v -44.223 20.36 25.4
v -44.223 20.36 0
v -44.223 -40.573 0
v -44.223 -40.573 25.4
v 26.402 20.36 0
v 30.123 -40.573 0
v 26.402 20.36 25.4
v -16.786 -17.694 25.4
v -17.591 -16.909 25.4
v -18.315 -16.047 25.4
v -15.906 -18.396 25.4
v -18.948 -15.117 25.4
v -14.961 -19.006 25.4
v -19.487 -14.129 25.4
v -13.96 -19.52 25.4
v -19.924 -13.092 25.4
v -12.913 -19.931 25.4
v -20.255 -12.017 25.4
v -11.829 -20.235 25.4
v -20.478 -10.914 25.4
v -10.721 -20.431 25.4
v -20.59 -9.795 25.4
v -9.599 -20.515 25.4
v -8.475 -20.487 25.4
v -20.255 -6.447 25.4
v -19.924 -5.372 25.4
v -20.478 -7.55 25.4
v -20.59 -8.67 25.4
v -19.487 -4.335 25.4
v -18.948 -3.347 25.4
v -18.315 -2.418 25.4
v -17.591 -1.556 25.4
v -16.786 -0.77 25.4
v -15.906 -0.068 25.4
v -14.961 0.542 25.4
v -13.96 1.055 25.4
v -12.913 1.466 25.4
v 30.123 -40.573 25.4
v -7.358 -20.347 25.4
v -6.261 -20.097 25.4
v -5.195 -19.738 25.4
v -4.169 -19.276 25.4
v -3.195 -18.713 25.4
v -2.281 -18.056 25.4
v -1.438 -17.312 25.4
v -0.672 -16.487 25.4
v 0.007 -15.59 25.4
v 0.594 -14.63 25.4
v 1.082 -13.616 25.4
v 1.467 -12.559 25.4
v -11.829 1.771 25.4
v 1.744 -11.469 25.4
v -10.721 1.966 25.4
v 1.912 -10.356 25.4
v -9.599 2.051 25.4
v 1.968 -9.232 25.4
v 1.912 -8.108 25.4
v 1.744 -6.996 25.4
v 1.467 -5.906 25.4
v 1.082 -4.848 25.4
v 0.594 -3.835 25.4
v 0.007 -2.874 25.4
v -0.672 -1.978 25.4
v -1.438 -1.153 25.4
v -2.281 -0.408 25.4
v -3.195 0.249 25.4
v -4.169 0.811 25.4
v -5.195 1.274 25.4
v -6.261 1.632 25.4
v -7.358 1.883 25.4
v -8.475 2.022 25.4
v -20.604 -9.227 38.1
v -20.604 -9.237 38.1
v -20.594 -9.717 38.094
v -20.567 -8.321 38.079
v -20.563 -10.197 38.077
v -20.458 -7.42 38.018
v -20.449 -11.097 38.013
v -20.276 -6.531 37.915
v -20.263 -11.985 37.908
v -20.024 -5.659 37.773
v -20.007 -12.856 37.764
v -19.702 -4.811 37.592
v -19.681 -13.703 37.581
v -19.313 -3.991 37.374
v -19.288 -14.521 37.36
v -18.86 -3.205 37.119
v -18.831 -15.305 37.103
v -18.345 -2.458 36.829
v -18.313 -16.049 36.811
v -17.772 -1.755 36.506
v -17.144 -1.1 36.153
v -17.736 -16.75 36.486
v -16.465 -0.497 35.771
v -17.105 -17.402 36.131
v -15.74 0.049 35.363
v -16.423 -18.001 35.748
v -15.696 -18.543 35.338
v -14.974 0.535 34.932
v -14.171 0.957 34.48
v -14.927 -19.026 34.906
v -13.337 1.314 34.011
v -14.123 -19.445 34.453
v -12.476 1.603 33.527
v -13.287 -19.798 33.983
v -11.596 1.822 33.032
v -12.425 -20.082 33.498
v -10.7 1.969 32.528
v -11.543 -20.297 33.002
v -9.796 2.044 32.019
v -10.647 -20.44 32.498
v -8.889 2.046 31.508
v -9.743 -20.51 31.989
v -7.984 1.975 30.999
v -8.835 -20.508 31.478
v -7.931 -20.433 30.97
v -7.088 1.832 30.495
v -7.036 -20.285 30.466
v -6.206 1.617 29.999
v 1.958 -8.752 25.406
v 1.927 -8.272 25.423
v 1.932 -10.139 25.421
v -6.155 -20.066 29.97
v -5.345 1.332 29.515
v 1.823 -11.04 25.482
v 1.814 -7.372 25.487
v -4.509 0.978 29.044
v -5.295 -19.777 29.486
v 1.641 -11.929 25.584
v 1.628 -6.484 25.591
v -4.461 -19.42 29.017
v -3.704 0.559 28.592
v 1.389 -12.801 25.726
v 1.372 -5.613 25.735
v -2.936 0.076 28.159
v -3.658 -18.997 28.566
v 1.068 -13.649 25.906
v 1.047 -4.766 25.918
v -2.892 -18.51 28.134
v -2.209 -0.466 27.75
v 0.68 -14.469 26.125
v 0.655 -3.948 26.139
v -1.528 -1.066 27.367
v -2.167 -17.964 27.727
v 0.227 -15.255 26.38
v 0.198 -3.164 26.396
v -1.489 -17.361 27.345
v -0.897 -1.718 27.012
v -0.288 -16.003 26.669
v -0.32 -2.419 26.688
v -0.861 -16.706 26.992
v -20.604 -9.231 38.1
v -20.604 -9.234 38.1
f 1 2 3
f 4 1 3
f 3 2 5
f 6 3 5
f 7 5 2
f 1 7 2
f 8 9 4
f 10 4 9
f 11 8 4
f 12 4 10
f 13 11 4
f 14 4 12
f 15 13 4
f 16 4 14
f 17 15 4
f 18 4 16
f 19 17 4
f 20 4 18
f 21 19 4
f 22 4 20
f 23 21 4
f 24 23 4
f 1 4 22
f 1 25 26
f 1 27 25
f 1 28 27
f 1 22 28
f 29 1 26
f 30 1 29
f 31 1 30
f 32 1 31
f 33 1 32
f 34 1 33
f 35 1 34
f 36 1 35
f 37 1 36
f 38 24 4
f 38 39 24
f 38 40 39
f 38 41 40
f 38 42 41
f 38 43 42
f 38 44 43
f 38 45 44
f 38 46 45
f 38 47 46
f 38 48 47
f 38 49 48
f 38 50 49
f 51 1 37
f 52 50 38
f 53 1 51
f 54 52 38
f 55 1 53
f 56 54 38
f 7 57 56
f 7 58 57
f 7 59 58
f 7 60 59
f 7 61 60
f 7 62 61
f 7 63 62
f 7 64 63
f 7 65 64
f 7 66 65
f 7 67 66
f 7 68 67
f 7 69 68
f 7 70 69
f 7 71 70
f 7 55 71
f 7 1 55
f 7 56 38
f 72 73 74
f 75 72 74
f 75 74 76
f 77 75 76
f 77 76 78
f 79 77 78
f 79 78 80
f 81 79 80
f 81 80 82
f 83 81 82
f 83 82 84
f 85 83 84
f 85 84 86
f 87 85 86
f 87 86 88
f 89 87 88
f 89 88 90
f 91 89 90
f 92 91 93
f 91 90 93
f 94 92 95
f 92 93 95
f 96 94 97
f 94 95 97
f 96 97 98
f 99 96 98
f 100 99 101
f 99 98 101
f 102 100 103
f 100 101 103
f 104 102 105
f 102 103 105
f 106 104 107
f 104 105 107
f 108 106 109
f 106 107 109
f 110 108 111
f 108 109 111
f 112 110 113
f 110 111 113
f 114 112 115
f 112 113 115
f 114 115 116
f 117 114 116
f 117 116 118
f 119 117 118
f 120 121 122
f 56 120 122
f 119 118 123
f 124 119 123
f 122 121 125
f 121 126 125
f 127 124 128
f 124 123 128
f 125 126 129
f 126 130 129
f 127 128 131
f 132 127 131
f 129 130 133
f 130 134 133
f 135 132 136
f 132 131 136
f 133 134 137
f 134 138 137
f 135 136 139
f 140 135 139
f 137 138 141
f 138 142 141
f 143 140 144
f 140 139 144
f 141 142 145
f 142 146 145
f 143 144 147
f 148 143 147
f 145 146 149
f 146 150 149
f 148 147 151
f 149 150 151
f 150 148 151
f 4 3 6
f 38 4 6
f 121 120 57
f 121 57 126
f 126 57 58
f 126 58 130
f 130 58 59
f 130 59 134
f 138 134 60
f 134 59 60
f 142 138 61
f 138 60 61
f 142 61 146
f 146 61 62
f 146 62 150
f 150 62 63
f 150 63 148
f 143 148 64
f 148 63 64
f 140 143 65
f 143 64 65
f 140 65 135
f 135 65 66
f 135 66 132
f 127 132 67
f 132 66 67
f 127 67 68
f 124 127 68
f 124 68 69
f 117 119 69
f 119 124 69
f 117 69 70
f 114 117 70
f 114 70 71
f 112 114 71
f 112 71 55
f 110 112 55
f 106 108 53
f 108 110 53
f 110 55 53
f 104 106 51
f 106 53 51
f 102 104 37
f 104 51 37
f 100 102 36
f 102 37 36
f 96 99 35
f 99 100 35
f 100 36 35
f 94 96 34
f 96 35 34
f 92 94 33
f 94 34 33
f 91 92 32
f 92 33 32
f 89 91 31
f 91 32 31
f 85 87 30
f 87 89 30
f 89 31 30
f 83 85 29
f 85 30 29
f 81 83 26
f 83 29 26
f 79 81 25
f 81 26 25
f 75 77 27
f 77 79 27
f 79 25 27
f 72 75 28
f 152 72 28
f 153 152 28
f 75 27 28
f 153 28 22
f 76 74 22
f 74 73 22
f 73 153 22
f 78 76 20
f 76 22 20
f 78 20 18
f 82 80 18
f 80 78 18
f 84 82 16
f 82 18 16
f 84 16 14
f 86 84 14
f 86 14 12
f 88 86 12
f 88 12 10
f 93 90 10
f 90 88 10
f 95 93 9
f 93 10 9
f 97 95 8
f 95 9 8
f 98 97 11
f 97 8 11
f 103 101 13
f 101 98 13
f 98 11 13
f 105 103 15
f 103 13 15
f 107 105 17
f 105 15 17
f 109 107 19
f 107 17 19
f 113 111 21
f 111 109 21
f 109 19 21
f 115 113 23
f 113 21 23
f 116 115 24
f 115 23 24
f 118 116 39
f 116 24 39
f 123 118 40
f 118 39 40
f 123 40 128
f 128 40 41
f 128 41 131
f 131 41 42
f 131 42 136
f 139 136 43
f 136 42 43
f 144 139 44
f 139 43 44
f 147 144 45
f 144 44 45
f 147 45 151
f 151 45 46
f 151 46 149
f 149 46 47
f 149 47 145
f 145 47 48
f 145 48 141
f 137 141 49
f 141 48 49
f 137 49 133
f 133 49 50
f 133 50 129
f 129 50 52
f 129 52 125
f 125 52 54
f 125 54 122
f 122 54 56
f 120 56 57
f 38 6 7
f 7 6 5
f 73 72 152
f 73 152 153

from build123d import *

# Parameters (mm, degrees)
F1_DEPTH = 25.4
F2_R     = 11.286244
F3_DEPTH = 12.7
F5_DEPTH = 60.933791


with BuildPart() as f1:
    # F0 (on Top) → F1 (new body)
    with BuildSketch(Plane.XY):
        Polygon((-44.223279, 20.360047), (-44.223279, -40.572744), (30.122576, -40.572744), (26.401911, 20.360047), align=None)
    extrude(amount=F1_DEPTH)

    # F2 (on face) → F3 (join)
    with BuildSketch(Plane.XY.offset(25.4)):
        with Locations((-9.318016, -9.232202)):
            Circle(F2_R)
    extrude(amount=F3_DEPTH)

    # F4 (on face) → F5 (cut, through all)
    with BuildSketch(Plane.XZ.offset(40.572744)):
        Polygon((1.968228, 38.1), (-20.604259, 38.1), (1.968228, 25.4), align=None)
    extrude(amount=-F5_DEPTH, mode=Mode.SUBTRACT)


solid = f1.part
